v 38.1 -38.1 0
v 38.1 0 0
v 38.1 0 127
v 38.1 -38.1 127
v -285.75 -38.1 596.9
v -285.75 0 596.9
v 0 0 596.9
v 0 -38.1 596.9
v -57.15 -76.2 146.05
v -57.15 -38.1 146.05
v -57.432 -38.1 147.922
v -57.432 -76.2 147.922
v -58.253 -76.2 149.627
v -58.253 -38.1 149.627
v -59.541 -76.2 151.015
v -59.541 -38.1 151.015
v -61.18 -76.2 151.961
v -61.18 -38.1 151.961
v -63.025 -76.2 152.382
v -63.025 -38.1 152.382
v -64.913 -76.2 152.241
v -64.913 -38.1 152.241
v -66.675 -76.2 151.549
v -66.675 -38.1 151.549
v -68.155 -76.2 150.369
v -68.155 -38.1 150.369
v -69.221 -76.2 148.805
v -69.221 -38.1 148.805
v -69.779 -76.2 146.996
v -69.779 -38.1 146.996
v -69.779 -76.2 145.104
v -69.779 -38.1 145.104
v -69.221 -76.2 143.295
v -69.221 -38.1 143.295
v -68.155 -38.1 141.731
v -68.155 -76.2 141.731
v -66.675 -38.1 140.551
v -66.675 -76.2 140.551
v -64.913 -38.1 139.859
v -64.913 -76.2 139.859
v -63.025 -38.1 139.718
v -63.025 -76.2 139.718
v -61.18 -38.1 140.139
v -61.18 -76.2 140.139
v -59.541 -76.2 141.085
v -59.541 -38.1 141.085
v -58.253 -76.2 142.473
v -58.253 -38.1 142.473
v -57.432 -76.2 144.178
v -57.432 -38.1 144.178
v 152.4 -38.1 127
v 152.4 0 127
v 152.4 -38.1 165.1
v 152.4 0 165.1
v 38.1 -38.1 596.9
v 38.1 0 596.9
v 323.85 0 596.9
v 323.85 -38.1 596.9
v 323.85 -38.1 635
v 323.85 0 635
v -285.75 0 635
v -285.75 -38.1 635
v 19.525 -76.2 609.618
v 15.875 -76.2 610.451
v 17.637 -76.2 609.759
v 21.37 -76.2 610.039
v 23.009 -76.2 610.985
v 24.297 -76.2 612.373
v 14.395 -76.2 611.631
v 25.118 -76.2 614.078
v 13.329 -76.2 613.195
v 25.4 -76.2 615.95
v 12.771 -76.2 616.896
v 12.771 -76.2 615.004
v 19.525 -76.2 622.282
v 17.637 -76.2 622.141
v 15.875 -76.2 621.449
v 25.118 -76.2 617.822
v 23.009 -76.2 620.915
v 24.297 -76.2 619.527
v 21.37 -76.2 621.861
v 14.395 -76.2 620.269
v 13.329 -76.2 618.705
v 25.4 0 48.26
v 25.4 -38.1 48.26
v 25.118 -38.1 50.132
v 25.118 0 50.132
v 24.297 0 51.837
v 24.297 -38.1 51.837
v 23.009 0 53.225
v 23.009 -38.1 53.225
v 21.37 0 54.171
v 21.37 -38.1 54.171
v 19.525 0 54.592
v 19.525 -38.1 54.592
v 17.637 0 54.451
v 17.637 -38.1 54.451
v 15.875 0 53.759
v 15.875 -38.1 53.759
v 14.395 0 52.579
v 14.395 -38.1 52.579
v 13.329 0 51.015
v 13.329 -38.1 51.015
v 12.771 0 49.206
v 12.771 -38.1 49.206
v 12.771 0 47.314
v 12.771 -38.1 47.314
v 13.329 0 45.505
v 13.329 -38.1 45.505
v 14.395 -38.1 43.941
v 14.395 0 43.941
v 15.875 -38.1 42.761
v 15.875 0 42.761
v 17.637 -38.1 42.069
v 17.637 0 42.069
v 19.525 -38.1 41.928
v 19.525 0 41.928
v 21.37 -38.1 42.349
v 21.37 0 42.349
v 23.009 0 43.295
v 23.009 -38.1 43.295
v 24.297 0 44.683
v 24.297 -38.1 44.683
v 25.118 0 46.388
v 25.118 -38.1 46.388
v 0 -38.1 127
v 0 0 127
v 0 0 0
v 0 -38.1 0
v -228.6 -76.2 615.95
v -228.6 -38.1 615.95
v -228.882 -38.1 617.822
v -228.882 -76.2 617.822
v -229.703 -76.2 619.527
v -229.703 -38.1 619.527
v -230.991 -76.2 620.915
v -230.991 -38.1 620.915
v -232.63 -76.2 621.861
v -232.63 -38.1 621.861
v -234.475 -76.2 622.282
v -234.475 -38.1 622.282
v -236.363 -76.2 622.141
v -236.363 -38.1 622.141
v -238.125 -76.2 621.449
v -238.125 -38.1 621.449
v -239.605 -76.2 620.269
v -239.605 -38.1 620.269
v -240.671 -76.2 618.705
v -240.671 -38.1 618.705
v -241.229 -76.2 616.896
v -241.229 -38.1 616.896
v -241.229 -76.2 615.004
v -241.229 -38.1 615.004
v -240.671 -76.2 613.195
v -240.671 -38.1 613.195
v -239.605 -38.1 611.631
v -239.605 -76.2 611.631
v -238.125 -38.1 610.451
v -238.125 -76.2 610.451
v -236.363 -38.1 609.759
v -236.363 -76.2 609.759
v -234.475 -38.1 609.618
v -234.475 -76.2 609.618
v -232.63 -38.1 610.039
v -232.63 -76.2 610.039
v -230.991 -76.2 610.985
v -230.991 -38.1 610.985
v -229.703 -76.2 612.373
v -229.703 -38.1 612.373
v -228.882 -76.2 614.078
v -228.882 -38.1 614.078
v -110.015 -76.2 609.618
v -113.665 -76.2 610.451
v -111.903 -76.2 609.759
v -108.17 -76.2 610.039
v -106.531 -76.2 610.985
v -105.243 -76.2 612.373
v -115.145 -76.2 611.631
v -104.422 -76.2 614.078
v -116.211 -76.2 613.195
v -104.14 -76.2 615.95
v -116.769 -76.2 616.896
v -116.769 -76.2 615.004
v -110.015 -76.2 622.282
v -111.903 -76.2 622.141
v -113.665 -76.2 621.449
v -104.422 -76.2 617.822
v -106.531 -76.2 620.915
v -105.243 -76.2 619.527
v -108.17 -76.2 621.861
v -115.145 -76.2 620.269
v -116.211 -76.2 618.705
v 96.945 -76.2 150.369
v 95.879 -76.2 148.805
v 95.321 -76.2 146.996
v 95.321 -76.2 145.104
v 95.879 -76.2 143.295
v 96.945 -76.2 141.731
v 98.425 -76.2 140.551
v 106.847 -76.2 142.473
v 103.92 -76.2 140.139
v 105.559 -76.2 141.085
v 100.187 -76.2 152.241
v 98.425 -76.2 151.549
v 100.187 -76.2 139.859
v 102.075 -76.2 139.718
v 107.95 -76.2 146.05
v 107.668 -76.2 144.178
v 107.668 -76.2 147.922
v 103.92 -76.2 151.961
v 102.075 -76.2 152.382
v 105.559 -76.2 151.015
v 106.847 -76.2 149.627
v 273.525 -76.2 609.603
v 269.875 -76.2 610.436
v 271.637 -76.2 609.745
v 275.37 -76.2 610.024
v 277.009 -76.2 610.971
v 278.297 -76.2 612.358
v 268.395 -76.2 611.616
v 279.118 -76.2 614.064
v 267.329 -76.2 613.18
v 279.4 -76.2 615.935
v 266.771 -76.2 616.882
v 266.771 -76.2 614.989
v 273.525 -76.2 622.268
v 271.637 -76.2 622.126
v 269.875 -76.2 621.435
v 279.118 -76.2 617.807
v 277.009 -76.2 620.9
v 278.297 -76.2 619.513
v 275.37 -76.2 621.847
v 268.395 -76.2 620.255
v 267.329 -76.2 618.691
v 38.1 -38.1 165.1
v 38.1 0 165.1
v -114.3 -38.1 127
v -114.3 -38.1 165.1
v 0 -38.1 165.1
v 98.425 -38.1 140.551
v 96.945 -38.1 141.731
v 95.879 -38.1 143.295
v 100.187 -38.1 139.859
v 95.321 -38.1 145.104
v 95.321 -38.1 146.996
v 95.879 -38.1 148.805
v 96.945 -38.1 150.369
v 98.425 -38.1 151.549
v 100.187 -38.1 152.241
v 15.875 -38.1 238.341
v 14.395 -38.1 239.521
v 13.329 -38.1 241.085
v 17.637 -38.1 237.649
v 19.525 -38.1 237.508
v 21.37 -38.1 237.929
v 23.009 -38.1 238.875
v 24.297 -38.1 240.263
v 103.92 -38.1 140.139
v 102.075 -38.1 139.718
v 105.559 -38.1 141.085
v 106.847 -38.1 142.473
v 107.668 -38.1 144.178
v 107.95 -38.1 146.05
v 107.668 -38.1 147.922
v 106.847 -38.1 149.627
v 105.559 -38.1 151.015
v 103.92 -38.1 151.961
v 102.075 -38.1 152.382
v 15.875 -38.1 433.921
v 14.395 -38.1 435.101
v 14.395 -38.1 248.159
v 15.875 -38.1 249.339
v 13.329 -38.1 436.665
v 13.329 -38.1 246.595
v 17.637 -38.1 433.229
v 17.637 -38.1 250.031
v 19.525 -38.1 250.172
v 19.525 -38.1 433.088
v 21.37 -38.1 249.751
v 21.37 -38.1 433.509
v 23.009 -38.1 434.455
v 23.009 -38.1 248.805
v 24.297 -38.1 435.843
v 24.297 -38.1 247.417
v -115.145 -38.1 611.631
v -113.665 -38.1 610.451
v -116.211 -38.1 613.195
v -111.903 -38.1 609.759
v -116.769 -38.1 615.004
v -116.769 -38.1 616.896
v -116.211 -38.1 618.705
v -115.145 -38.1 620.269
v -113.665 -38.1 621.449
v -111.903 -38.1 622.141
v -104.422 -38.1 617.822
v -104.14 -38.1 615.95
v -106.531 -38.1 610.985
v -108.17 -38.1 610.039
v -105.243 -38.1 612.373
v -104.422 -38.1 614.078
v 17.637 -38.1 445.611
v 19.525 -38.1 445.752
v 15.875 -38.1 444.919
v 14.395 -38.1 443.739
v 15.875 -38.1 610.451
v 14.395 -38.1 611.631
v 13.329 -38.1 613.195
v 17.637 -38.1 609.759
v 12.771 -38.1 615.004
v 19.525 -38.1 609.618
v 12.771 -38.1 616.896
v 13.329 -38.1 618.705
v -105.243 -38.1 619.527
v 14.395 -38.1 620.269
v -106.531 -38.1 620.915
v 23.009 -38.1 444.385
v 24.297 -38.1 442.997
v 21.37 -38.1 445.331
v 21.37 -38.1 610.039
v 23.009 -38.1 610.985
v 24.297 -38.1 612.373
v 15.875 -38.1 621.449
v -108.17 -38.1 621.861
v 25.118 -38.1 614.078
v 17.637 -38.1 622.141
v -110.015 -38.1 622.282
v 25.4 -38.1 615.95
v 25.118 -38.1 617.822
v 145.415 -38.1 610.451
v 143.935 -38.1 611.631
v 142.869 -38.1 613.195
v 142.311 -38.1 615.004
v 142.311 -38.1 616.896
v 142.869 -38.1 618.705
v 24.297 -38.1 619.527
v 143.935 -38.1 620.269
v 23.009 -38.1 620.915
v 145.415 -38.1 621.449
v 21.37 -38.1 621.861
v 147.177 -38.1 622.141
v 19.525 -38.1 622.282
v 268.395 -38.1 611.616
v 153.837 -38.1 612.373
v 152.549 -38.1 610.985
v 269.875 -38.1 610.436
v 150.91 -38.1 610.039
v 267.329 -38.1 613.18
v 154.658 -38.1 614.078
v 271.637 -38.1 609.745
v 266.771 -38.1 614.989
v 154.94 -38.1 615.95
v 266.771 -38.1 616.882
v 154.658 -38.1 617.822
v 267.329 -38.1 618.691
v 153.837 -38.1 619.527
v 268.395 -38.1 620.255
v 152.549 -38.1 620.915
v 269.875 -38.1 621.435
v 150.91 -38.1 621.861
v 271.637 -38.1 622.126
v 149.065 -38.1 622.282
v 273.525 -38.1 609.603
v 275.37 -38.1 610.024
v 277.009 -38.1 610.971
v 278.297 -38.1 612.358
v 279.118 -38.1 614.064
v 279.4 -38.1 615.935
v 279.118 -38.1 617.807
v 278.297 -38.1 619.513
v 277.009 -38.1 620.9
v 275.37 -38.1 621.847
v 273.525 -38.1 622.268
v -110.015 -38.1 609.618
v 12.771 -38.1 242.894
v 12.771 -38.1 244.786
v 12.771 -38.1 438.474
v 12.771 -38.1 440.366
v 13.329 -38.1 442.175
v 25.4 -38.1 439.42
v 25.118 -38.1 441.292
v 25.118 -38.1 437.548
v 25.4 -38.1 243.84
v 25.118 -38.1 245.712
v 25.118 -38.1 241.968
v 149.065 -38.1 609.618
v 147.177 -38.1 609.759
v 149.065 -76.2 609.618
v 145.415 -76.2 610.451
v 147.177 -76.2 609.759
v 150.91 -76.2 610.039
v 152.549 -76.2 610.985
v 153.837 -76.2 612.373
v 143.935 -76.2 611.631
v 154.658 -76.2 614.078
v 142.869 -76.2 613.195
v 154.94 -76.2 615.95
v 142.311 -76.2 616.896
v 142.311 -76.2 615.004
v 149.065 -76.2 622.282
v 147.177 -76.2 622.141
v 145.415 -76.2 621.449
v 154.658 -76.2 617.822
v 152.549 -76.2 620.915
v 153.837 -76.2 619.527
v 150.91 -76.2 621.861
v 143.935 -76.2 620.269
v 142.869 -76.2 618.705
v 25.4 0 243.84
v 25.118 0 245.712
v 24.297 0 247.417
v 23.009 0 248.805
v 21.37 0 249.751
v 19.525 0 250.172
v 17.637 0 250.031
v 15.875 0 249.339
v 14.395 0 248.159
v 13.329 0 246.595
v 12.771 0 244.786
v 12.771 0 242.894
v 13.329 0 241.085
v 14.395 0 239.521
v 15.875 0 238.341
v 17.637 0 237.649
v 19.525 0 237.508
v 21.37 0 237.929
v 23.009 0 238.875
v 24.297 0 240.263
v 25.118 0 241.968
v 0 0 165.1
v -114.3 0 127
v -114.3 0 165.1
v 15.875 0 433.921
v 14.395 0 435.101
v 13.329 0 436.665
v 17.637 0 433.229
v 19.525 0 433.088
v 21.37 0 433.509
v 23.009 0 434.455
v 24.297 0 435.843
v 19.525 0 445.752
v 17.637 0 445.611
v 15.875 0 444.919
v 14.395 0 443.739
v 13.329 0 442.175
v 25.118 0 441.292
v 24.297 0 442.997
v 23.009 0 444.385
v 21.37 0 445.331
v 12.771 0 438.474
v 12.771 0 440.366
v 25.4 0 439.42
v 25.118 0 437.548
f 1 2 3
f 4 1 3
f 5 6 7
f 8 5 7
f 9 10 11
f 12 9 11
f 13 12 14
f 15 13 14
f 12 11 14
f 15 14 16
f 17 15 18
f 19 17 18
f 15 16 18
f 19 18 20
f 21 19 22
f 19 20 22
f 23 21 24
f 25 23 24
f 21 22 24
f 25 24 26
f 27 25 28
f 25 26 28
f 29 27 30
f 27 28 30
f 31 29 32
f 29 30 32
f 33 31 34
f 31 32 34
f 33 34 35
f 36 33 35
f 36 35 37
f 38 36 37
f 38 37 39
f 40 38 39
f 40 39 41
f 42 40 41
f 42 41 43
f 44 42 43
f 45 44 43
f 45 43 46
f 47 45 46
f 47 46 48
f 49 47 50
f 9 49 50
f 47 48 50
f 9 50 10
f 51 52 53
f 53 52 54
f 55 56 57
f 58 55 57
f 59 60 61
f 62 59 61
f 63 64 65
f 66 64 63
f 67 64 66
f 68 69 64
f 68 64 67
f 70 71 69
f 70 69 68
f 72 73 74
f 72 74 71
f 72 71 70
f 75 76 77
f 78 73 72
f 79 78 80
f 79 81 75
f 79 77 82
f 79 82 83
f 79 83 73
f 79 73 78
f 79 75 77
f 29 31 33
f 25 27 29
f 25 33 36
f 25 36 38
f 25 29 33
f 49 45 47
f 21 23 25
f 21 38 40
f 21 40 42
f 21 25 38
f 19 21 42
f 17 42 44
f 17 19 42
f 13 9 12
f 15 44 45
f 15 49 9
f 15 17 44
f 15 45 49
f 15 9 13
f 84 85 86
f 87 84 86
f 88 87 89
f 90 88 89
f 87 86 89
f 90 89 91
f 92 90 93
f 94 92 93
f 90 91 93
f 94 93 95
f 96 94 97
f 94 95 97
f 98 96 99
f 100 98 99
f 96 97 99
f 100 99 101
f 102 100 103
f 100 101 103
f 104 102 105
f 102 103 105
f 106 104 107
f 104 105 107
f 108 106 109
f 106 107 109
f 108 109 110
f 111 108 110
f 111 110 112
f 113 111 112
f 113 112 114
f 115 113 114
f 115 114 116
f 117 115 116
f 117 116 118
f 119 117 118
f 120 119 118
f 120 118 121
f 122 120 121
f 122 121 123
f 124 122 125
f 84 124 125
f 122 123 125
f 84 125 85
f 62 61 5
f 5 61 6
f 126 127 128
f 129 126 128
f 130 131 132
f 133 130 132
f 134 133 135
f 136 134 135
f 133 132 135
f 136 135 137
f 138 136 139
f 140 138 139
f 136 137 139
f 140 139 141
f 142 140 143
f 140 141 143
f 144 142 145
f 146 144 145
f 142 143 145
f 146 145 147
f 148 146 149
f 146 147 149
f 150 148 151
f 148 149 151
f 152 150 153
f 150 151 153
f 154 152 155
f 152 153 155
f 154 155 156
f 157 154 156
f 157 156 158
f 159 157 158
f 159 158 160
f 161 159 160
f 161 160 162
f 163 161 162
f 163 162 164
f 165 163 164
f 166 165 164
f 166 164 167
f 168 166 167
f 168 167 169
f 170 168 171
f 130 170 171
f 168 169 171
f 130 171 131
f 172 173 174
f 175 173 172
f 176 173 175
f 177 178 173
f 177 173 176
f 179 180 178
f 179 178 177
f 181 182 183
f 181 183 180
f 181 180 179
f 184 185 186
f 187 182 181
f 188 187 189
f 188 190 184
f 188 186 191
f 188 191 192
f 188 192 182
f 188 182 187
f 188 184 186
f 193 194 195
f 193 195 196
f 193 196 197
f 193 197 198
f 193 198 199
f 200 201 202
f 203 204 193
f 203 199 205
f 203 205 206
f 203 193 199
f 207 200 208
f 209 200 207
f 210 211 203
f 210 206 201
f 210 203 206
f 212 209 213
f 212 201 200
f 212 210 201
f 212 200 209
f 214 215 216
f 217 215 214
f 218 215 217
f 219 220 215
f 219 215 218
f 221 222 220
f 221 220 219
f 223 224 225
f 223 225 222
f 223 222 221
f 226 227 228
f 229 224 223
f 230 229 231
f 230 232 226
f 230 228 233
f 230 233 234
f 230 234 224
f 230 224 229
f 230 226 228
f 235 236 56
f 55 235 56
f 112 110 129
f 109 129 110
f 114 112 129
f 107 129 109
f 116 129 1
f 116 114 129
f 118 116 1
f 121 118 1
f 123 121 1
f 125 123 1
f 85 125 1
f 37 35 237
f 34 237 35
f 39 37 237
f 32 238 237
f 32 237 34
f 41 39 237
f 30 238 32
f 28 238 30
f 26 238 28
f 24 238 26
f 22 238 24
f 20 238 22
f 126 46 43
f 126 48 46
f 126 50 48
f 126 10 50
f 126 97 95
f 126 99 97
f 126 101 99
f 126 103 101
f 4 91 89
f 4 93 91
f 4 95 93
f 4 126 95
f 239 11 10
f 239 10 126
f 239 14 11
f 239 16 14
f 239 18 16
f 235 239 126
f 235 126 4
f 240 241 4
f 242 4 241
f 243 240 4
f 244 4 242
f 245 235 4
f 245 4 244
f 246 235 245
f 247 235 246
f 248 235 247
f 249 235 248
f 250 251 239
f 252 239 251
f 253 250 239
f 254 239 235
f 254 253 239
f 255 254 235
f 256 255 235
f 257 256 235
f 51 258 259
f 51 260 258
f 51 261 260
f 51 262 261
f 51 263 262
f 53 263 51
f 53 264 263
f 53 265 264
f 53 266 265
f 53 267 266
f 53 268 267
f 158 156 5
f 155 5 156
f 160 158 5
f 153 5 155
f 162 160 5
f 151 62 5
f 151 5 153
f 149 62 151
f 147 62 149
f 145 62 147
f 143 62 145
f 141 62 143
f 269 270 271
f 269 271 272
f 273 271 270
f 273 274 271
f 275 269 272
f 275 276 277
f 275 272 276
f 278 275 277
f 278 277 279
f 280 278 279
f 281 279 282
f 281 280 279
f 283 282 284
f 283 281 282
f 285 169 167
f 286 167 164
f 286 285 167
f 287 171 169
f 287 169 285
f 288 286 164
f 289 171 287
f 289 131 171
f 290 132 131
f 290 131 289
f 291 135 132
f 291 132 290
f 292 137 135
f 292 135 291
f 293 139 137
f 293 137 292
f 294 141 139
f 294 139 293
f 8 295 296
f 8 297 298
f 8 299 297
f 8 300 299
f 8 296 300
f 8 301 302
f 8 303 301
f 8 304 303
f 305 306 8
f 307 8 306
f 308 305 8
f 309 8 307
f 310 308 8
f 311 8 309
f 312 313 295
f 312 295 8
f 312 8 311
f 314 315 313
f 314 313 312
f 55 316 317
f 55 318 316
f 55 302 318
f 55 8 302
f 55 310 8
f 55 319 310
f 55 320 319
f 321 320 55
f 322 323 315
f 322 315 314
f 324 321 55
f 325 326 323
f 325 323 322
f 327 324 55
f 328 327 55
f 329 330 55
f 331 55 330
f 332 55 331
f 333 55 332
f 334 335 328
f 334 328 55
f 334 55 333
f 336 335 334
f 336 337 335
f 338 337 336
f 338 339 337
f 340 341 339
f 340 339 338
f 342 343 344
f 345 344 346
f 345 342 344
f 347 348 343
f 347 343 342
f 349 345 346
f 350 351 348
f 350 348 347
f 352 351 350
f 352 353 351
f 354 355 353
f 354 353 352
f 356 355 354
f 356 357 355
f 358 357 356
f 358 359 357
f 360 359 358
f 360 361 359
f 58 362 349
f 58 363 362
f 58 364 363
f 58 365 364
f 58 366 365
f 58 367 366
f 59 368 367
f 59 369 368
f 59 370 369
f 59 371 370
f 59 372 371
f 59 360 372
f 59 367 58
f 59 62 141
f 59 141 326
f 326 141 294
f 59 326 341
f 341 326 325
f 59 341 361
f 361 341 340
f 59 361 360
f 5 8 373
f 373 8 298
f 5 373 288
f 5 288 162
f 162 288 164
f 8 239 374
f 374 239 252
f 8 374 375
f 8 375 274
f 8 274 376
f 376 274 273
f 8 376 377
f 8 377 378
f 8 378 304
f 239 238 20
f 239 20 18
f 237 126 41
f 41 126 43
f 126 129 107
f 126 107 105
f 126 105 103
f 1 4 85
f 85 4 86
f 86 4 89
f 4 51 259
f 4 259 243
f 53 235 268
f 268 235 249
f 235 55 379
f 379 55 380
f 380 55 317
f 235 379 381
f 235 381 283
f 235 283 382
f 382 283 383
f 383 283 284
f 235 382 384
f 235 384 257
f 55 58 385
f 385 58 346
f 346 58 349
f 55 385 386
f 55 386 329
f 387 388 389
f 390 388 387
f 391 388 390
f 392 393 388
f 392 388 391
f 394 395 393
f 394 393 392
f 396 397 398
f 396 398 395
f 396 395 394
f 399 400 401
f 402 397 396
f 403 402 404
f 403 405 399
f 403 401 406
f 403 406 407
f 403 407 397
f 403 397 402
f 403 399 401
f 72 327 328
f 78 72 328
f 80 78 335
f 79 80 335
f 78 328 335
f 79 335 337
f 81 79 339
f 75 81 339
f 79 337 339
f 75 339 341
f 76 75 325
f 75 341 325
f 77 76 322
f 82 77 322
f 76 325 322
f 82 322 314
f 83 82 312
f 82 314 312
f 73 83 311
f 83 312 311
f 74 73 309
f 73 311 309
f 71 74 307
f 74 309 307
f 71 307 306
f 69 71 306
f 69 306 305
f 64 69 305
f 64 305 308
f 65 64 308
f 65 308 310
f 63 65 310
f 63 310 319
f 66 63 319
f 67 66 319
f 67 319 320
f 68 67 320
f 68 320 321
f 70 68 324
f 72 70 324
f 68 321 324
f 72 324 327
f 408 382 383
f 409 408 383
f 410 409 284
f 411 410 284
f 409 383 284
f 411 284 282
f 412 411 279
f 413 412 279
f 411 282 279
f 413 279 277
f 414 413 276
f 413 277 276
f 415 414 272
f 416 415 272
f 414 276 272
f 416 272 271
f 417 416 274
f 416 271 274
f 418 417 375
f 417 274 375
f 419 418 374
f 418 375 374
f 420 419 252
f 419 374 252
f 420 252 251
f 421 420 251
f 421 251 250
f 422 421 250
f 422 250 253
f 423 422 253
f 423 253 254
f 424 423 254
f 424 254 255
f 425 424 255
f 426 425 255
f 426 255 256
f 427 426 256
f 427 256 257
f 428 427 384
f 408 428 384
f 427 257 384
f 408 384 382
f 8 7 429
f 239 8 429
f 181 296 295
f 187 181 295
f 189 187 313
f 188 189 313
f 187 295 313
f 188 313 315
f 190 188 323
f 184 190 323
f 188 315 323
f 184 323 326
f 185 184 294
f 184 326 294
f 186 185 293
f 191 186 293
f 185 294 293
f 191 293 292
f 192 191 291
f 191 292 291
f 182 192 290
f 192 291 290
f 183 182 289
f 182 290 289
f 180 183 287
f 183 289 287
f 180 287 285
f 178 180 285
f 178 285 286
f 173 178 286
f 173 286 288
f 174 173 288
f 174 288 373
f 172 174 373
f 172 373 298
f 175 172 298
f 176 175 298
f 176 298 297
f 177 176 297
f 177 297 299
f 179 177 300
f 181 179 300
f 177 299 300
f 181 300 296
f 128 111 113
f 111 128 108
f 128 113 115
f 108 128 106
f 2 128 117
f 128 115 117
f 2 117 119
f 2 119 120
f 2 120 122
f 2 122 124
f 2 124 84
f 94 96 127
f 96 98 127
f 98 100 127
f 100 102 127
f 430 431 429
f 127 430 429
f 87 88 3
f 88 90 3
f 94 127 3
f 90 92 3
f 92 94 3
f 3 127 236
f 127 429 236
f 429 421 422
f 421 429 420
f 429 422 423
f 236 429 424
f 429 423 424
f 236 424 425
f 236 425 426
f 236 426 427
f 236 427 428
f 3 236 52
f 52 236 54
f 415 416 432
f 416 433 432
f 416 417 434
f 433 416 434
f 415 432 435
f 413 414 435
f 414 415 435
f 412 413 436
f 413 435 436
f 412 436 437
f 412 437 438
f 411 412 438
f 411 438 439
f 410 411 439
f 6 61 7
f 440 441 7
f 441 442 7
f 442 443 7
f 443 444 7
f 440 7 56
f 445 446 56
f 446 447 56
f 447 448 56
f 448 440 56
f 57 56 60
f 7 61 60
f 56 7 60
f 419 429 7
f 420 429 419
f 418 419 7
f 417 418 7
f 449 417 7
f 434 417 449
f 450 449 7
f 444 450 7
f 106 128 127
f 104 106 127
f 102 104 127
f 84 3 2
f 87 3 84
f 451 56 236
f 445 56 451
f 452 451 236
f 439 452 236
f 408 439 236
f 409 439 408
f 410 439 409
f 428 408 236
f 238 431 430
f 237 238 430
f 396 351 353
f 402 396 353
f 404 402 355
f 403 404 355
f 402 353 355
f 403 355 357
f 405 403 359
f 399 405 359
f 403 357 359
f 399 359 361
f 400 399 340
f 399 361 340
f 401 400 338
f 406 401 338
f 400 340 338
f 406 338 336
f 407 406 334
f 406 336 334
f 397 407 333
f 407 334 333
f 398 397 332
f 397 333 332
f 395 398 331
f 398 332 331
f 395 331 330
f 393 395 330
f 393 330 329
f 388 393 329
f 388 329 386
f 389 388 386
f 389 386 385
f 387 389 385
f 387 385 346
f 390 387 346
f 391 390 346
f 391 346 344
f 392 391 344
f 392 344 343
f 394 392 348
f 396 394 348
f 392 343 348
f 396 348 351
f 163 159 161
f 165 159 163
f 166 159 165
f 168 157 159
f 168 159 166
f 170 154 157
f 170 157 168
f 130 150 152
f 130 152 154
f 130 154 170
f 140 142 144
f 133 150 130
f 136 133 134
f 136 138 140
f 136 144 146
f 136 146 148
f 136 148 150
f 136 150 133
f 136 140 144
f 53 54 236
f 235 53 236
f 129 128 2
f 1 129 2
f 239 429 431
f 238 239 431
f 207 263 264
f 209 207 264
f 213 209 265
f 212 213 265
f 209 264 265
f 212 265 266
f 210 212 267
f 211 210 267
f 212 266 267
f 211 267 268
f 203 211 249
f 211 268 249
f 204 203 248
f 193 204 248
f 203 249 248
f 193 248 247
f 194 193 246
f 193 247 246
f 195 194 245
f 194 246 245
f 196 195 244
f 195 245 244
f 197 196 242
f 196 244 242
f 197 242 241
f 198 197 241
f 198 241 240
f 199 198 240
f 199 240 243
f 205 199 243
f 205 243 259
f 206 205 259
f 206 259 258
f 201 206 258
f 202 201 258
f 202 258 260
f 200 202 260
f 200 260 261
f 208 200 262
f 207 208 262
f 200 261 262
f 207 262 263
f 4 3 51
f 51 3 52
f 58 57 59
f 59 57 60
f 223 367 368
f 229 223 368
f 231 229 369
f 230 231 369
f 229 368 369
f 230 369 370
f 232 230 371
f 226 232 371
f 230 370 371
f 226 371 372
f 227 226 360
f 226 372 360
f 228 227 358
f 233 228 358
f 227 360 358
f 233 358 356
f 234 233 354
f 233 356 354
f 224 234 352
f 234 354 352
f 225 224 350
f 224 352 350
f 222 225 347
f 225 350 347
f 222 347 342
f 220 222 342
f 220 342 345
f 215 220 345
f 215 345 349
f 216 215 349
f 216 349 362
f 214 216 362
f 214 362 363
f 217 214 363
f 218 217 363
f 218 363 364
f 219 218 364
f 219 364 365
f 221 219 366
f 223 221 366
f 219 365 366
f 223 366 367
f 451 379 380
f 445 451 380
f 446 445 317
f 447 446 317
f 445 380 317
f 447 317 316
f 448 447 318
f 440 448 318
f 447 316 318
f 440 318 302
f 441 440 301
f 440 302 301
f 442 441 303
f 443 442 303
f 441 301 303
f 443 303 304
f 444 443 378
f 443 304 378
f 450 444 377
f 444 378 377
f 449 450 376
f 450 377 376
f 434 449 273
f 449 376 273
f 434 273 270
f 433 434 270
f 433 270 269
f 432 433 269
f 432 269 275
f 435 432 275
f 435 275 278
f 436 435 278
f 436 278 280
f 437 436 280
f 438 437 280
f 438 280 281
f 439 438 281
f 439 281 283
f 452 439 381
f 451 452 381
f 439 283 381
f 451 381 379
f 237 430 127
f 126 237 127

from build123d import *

# Parameters (mm, degrees)
F1_DEPTH = 38.1
F2_DEPTH = 38.1
F3_R     = 6.35
F4_DEPTH = 38.1
F5_R     = 6.35
F6_DEPTH = 38.1


with BuildPart() as f1:
    # F0 (on Front) → F1 (new body)
    with BuildSketch(Plane.XZ):
        Polygon((323.85, 635), (-285.75, 635), (-285.75, 596.9), (0, 596.9), (0, 165.1), (-114.3, 165.1), (-114.3, 127), (0, 127), (0, 0), (38.1, 0), (38.1, 127), (152.4, 127), (152.4, 165.1), (38.1, 165.1), (38.1, 596.9), (323.85, 596.9), align=None)
    extrude(amount=F1_DEPTH)

    # F0 (on Front) → F2 (join)
    with BuildSketch(Plane.XZ):
        Polygon((323.85, 635), (-285.75, 635), (-285.75, 596.9), (0, 596.9), (0, 165.1), (-114.3, 165.1), (-114.3, 127), (0, 127), (0, 0), (38.1, 0), (38.1, 127), (152.4, 127), (152.4, 165.1), (38.1, 165.1), (38.1, 596.9), (323.85, 596.9), align=None)
    extrude(amount=F2_DEPTH)

    # F3 (on face) → F4 (join)
    with BuildSketch(Plane.XZ.offset(38.1)):
        with Locations((-234.95, 615.95)):
            Circle(F3_R)
        with Locations((-110.49, 615.95)):
            Circle(F3_R)
        with Locations((19.05, 615.95)):
            Circle(F3_R)
        with Locations((148.59, 615.95)):
            Circle(F3_R)
        with Locations((273.05, 615.93546)):
            Circle(F3_R)
        with Locations((-63.5, 146.05)):
            Circle(F3_R)
        with Locations((101.6, 146.05)):
            Circle(F3_R)
    extrude(amount=F4_DEPTH)

    # F5 (on face) → F6 (cut)
    with BuildSketch(Plane.XZ.offset(38.1)):
        with Locations((19.05, 439.42)):
            Circle(F5_R)
        with Locations((19.05, 243.84)):
            Circle(F5_R)
        with Locations((19.05, 48.26)):
            Circle(F5_R)
    extrude(amount=-F6_DEPTH, mode=Mode.SUBTRACT)


solid = f1.part
